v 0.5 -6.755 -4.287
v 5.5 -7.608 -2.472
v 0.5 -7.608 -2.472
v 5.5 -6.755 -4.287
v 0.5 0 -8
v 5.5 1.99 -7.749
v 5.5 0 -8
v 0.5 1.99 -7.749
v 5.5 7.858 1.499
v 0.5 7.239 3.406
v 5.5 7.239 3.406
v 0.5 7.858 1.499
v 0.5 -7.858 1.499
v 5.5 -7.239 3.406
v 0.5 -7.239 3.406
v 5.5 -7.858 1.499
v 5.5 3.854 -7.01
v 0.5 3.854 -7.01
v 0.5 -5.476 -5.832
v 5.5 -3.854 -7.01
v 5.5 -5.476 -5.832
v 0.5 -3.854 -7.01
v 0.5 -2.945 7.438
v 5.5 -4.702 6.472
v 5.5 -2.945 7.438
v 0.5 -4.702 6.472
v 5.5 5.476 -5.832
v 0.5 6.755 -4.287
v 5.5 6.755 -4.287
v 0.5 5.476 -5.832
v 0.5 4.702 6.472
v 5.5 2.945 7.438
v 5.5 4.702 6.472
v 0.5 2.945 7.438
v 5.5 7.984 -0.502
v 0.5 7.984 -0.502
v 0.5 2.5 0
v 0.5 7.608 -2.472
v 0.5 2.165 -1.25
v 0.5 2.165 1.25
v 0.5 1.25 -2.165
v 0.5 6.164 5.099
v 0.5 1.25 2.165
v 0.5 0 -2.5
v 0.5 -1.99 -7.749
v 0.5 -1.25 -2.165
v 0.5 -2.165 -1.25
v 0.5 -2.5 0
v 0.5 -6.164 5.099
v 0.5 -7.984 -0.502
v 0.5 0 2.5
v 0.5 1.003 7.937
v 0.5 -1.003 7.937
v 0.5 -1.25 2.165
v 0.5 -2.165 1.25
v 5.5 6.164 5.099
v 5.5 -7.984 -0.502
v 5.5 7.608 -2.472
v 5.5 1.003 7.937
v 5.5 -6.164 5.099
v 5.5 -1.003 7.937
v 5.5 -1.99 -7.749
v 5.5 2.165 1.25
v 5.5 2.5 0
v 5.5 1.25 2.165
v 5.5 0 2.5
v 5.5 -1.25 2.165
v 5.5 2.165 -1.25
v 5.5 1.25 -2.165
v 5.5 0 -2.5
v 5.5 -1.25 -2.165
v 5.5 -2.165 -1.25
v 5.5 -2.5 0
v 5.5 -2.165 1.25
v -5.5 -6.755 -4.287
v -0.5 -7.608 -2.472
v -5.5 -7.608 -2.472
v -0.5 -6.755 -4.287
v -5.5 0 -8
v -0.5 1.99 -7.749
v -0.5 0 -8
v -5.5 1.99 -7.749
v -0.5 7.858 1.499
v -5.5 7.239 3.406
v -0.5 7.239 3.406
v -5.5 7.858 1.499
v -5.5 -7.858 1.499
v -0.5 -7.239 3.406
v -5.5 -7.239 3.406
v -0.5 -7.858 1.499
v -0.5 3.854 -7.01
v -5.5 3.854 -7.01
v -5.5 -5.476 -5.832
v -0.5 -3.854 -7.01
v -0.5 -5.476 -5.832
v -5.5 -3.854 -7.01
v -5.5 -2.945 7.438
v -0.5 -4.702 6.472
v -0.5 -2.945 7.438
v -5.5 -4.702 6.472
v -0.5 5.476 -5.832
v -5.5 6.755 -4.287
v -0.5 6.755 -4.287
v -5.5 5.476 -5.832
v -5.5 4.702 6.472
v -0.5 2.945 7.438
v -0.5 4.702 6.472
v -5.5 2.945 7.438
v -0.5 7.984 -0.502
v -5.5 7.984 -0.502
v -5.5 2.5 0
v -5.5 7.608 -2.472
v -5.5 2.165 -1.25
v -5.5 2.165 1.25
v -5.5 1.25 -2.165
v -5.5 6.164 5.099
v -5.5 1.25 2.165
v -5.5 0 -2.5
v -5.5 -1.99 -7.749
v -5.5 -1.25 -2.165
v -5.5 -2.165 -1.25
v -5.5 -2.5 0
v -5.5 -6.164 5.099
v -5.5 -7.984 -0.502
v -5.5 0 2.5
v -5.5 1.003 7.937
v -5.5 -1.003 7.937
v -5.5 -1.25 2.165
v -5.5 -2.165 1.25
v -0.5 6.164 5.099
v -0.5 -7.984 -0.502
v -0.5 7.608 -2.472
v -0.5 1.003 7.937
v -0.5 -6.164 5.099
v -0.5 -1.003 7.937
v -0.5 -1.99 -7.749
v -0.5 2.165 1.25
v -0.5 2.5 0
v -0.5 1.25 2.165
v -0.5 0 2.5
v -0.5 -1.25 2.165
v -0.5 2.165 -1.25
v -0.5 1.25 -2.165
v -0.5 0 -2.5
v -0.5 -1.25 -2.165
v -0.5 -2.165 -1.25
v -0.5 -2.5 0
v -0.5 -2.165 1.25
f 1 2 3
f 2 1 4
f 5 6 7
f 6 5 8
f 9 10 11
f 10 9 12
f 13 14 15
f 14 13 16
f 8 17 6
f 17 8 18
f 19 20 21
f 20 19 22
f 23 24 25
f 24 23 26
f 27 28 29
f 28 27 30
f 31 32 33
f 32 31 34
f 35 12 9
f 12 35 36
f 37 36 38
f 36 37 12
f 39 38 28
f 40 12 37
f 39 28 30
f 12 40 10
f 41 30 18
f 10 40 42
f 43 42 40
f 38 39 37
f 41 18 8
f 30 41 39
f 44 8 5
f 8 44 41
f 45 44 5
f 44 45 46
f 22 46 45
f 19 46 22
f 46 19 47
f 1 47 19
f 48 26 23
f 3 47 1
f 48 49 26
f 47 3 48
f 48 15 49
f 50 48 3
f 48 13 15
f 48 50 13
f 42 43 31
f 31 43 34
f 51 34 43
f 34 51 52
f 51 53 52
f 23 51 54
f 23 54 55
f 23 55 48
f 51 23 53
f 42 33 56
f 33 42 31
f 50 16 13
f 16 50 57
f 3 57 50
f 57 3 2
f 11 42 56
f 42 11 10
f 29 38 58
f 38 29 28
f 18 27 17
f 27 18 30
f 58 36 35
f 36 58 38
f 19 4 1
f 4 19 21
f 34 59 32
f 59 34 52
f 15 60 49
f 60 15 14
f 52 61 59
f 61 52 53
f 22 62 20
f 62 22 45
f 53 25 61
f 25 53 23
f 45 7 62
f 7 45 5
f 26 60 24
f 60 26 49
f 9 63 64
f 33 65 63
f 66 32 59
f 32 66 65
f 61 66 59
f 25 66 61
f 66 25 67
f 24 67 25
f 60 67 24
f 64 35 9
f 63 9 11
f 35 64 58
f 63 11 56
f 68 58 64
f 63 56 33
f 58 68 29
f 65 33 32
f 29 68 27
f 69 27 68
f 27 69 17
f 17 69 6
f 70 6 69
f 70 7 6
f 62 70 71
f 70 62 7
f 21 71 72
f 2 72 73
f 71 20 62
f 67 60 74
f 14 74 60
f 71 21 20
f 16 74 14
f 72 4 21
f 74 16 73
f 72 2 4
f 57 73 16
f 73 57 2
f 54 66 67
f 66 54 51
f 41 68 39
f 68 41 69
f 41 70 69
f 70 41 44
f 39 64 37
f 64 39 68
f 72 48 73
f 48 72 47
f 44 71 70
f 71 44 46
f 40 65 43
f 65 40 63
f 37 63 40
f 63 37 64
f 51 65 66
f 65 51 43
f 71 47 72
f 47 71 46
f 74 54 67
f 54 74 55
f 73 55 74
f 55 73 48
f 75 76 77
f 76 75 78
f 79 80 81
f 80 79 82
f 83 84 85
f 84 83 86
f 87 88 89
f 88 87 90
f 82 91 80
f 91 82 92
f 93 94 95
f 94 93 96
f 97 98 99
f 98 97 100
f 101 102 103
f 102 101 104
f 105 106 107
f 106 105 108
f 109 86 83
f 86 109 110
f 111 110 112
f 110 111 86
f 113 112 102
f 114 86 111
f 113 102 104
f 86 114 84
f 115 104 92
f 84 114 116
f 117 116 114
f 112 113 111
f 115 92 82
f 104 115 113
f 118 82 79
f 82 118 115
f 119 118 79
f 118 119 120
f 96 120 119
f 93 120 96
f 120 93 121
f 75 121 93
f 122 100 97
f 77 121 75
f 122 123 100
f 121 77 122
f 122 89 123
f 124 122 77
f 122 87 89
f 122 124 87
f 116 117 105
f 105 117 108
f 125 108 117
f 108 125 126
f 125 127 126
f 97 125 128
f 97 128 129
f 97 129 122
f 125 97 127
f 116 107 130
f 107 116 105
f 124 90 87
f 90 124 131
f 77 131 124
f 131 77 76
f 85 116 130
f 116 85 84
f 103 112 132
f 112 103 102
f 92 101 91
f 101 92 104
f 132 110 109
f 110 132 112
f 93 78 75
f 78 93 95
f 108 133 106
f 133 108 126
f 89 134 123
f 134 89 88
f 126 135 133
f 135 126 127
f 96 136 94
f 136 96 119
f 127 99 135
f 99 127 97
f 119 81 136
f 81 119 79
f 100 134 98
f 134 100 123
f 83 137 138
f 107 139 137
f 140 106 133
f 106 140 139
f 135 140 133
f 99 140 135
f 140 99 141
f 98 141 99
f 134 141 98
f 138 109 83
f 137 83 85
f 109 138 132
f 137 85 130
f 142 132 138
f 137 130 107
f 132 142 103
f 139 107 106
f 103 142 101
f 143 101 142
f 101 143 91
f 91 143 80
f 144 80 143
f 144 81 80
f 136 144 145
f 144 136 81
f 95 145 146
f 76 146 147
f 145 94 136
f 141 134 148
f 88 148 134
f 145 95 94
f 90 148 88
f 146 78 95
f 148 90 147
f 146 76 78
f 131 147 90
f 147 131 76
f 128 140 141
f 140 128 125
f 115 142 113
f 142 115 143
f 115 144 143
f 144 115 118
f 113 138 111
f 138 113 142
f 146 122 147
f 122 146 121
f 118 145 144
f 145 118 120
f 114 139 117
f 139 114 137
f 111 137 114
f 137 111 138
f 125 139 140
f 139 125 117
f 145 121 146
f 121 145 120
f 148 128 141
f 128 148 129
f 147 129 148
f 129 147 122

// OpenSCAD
//cylinder(h=10.25, d=24, $fn=50, center=true);

wheel_width = 10.25;
wheel_diameter = 25;
wheel_bevel_leftover_width = 6;
bevel_size = (wheel_width-wheel_bevel_leftover_width)/2;
bearing_diameter=16;
bearing_hole_diameter=5;
bearing_width=5;

smoothness=50;

PC_WHEEL();

module PC_WHEEL(){
    rotate([0,90,0]){
    PC_WHEEL_RIM();

    translate([0,0,bearing_width/2+.5])
    PC_WHEEL_BEARING(bearing_diameter, bearing_width, bearing_hole_diameter, smoothness);

    translate([0,0,-bearing_width/2-.5])
    PC_WHEEL_BEARING(bearing_diameter, bearing_width, bearing_hole_diameter, smoothness);
    }
}

module PC_WHEEL_RIM(){
    %color("LightGrey",0.75)
    rotate_extrude(convexity = 10, $fn = smoothness)
    rotate([0,0,-90])
    polygon(
        [
            [wheel_width/2, bearing_diameter/2],
            [wheel_width/2, wheel_diameter/2-bevel_size],
            [wheel_width/2-bevel_size, wheel_diameter/2],
            [-wheel_width/2+bevel_size, wheel_diameter/2],
            [-wheel_width/2, wheel_diameter/2-bevel_size],
            [-wheel_width/2, bearing_diameter/2]
        ]
    );  
}
module PC_WHEEL_BEARING(bearing_diameter, bearing_width, bearing_hole_diameter, smoothness){
    color("grey")
    difference(){
        cylinder(d=bearing_diameter, h=bearing_width, $fn=smoothness/2, center=true);
        cylinder(d=bearing_hole_diameter, h=bearing_width+1, $fn=smoothness/4, center=true);
    }
}
